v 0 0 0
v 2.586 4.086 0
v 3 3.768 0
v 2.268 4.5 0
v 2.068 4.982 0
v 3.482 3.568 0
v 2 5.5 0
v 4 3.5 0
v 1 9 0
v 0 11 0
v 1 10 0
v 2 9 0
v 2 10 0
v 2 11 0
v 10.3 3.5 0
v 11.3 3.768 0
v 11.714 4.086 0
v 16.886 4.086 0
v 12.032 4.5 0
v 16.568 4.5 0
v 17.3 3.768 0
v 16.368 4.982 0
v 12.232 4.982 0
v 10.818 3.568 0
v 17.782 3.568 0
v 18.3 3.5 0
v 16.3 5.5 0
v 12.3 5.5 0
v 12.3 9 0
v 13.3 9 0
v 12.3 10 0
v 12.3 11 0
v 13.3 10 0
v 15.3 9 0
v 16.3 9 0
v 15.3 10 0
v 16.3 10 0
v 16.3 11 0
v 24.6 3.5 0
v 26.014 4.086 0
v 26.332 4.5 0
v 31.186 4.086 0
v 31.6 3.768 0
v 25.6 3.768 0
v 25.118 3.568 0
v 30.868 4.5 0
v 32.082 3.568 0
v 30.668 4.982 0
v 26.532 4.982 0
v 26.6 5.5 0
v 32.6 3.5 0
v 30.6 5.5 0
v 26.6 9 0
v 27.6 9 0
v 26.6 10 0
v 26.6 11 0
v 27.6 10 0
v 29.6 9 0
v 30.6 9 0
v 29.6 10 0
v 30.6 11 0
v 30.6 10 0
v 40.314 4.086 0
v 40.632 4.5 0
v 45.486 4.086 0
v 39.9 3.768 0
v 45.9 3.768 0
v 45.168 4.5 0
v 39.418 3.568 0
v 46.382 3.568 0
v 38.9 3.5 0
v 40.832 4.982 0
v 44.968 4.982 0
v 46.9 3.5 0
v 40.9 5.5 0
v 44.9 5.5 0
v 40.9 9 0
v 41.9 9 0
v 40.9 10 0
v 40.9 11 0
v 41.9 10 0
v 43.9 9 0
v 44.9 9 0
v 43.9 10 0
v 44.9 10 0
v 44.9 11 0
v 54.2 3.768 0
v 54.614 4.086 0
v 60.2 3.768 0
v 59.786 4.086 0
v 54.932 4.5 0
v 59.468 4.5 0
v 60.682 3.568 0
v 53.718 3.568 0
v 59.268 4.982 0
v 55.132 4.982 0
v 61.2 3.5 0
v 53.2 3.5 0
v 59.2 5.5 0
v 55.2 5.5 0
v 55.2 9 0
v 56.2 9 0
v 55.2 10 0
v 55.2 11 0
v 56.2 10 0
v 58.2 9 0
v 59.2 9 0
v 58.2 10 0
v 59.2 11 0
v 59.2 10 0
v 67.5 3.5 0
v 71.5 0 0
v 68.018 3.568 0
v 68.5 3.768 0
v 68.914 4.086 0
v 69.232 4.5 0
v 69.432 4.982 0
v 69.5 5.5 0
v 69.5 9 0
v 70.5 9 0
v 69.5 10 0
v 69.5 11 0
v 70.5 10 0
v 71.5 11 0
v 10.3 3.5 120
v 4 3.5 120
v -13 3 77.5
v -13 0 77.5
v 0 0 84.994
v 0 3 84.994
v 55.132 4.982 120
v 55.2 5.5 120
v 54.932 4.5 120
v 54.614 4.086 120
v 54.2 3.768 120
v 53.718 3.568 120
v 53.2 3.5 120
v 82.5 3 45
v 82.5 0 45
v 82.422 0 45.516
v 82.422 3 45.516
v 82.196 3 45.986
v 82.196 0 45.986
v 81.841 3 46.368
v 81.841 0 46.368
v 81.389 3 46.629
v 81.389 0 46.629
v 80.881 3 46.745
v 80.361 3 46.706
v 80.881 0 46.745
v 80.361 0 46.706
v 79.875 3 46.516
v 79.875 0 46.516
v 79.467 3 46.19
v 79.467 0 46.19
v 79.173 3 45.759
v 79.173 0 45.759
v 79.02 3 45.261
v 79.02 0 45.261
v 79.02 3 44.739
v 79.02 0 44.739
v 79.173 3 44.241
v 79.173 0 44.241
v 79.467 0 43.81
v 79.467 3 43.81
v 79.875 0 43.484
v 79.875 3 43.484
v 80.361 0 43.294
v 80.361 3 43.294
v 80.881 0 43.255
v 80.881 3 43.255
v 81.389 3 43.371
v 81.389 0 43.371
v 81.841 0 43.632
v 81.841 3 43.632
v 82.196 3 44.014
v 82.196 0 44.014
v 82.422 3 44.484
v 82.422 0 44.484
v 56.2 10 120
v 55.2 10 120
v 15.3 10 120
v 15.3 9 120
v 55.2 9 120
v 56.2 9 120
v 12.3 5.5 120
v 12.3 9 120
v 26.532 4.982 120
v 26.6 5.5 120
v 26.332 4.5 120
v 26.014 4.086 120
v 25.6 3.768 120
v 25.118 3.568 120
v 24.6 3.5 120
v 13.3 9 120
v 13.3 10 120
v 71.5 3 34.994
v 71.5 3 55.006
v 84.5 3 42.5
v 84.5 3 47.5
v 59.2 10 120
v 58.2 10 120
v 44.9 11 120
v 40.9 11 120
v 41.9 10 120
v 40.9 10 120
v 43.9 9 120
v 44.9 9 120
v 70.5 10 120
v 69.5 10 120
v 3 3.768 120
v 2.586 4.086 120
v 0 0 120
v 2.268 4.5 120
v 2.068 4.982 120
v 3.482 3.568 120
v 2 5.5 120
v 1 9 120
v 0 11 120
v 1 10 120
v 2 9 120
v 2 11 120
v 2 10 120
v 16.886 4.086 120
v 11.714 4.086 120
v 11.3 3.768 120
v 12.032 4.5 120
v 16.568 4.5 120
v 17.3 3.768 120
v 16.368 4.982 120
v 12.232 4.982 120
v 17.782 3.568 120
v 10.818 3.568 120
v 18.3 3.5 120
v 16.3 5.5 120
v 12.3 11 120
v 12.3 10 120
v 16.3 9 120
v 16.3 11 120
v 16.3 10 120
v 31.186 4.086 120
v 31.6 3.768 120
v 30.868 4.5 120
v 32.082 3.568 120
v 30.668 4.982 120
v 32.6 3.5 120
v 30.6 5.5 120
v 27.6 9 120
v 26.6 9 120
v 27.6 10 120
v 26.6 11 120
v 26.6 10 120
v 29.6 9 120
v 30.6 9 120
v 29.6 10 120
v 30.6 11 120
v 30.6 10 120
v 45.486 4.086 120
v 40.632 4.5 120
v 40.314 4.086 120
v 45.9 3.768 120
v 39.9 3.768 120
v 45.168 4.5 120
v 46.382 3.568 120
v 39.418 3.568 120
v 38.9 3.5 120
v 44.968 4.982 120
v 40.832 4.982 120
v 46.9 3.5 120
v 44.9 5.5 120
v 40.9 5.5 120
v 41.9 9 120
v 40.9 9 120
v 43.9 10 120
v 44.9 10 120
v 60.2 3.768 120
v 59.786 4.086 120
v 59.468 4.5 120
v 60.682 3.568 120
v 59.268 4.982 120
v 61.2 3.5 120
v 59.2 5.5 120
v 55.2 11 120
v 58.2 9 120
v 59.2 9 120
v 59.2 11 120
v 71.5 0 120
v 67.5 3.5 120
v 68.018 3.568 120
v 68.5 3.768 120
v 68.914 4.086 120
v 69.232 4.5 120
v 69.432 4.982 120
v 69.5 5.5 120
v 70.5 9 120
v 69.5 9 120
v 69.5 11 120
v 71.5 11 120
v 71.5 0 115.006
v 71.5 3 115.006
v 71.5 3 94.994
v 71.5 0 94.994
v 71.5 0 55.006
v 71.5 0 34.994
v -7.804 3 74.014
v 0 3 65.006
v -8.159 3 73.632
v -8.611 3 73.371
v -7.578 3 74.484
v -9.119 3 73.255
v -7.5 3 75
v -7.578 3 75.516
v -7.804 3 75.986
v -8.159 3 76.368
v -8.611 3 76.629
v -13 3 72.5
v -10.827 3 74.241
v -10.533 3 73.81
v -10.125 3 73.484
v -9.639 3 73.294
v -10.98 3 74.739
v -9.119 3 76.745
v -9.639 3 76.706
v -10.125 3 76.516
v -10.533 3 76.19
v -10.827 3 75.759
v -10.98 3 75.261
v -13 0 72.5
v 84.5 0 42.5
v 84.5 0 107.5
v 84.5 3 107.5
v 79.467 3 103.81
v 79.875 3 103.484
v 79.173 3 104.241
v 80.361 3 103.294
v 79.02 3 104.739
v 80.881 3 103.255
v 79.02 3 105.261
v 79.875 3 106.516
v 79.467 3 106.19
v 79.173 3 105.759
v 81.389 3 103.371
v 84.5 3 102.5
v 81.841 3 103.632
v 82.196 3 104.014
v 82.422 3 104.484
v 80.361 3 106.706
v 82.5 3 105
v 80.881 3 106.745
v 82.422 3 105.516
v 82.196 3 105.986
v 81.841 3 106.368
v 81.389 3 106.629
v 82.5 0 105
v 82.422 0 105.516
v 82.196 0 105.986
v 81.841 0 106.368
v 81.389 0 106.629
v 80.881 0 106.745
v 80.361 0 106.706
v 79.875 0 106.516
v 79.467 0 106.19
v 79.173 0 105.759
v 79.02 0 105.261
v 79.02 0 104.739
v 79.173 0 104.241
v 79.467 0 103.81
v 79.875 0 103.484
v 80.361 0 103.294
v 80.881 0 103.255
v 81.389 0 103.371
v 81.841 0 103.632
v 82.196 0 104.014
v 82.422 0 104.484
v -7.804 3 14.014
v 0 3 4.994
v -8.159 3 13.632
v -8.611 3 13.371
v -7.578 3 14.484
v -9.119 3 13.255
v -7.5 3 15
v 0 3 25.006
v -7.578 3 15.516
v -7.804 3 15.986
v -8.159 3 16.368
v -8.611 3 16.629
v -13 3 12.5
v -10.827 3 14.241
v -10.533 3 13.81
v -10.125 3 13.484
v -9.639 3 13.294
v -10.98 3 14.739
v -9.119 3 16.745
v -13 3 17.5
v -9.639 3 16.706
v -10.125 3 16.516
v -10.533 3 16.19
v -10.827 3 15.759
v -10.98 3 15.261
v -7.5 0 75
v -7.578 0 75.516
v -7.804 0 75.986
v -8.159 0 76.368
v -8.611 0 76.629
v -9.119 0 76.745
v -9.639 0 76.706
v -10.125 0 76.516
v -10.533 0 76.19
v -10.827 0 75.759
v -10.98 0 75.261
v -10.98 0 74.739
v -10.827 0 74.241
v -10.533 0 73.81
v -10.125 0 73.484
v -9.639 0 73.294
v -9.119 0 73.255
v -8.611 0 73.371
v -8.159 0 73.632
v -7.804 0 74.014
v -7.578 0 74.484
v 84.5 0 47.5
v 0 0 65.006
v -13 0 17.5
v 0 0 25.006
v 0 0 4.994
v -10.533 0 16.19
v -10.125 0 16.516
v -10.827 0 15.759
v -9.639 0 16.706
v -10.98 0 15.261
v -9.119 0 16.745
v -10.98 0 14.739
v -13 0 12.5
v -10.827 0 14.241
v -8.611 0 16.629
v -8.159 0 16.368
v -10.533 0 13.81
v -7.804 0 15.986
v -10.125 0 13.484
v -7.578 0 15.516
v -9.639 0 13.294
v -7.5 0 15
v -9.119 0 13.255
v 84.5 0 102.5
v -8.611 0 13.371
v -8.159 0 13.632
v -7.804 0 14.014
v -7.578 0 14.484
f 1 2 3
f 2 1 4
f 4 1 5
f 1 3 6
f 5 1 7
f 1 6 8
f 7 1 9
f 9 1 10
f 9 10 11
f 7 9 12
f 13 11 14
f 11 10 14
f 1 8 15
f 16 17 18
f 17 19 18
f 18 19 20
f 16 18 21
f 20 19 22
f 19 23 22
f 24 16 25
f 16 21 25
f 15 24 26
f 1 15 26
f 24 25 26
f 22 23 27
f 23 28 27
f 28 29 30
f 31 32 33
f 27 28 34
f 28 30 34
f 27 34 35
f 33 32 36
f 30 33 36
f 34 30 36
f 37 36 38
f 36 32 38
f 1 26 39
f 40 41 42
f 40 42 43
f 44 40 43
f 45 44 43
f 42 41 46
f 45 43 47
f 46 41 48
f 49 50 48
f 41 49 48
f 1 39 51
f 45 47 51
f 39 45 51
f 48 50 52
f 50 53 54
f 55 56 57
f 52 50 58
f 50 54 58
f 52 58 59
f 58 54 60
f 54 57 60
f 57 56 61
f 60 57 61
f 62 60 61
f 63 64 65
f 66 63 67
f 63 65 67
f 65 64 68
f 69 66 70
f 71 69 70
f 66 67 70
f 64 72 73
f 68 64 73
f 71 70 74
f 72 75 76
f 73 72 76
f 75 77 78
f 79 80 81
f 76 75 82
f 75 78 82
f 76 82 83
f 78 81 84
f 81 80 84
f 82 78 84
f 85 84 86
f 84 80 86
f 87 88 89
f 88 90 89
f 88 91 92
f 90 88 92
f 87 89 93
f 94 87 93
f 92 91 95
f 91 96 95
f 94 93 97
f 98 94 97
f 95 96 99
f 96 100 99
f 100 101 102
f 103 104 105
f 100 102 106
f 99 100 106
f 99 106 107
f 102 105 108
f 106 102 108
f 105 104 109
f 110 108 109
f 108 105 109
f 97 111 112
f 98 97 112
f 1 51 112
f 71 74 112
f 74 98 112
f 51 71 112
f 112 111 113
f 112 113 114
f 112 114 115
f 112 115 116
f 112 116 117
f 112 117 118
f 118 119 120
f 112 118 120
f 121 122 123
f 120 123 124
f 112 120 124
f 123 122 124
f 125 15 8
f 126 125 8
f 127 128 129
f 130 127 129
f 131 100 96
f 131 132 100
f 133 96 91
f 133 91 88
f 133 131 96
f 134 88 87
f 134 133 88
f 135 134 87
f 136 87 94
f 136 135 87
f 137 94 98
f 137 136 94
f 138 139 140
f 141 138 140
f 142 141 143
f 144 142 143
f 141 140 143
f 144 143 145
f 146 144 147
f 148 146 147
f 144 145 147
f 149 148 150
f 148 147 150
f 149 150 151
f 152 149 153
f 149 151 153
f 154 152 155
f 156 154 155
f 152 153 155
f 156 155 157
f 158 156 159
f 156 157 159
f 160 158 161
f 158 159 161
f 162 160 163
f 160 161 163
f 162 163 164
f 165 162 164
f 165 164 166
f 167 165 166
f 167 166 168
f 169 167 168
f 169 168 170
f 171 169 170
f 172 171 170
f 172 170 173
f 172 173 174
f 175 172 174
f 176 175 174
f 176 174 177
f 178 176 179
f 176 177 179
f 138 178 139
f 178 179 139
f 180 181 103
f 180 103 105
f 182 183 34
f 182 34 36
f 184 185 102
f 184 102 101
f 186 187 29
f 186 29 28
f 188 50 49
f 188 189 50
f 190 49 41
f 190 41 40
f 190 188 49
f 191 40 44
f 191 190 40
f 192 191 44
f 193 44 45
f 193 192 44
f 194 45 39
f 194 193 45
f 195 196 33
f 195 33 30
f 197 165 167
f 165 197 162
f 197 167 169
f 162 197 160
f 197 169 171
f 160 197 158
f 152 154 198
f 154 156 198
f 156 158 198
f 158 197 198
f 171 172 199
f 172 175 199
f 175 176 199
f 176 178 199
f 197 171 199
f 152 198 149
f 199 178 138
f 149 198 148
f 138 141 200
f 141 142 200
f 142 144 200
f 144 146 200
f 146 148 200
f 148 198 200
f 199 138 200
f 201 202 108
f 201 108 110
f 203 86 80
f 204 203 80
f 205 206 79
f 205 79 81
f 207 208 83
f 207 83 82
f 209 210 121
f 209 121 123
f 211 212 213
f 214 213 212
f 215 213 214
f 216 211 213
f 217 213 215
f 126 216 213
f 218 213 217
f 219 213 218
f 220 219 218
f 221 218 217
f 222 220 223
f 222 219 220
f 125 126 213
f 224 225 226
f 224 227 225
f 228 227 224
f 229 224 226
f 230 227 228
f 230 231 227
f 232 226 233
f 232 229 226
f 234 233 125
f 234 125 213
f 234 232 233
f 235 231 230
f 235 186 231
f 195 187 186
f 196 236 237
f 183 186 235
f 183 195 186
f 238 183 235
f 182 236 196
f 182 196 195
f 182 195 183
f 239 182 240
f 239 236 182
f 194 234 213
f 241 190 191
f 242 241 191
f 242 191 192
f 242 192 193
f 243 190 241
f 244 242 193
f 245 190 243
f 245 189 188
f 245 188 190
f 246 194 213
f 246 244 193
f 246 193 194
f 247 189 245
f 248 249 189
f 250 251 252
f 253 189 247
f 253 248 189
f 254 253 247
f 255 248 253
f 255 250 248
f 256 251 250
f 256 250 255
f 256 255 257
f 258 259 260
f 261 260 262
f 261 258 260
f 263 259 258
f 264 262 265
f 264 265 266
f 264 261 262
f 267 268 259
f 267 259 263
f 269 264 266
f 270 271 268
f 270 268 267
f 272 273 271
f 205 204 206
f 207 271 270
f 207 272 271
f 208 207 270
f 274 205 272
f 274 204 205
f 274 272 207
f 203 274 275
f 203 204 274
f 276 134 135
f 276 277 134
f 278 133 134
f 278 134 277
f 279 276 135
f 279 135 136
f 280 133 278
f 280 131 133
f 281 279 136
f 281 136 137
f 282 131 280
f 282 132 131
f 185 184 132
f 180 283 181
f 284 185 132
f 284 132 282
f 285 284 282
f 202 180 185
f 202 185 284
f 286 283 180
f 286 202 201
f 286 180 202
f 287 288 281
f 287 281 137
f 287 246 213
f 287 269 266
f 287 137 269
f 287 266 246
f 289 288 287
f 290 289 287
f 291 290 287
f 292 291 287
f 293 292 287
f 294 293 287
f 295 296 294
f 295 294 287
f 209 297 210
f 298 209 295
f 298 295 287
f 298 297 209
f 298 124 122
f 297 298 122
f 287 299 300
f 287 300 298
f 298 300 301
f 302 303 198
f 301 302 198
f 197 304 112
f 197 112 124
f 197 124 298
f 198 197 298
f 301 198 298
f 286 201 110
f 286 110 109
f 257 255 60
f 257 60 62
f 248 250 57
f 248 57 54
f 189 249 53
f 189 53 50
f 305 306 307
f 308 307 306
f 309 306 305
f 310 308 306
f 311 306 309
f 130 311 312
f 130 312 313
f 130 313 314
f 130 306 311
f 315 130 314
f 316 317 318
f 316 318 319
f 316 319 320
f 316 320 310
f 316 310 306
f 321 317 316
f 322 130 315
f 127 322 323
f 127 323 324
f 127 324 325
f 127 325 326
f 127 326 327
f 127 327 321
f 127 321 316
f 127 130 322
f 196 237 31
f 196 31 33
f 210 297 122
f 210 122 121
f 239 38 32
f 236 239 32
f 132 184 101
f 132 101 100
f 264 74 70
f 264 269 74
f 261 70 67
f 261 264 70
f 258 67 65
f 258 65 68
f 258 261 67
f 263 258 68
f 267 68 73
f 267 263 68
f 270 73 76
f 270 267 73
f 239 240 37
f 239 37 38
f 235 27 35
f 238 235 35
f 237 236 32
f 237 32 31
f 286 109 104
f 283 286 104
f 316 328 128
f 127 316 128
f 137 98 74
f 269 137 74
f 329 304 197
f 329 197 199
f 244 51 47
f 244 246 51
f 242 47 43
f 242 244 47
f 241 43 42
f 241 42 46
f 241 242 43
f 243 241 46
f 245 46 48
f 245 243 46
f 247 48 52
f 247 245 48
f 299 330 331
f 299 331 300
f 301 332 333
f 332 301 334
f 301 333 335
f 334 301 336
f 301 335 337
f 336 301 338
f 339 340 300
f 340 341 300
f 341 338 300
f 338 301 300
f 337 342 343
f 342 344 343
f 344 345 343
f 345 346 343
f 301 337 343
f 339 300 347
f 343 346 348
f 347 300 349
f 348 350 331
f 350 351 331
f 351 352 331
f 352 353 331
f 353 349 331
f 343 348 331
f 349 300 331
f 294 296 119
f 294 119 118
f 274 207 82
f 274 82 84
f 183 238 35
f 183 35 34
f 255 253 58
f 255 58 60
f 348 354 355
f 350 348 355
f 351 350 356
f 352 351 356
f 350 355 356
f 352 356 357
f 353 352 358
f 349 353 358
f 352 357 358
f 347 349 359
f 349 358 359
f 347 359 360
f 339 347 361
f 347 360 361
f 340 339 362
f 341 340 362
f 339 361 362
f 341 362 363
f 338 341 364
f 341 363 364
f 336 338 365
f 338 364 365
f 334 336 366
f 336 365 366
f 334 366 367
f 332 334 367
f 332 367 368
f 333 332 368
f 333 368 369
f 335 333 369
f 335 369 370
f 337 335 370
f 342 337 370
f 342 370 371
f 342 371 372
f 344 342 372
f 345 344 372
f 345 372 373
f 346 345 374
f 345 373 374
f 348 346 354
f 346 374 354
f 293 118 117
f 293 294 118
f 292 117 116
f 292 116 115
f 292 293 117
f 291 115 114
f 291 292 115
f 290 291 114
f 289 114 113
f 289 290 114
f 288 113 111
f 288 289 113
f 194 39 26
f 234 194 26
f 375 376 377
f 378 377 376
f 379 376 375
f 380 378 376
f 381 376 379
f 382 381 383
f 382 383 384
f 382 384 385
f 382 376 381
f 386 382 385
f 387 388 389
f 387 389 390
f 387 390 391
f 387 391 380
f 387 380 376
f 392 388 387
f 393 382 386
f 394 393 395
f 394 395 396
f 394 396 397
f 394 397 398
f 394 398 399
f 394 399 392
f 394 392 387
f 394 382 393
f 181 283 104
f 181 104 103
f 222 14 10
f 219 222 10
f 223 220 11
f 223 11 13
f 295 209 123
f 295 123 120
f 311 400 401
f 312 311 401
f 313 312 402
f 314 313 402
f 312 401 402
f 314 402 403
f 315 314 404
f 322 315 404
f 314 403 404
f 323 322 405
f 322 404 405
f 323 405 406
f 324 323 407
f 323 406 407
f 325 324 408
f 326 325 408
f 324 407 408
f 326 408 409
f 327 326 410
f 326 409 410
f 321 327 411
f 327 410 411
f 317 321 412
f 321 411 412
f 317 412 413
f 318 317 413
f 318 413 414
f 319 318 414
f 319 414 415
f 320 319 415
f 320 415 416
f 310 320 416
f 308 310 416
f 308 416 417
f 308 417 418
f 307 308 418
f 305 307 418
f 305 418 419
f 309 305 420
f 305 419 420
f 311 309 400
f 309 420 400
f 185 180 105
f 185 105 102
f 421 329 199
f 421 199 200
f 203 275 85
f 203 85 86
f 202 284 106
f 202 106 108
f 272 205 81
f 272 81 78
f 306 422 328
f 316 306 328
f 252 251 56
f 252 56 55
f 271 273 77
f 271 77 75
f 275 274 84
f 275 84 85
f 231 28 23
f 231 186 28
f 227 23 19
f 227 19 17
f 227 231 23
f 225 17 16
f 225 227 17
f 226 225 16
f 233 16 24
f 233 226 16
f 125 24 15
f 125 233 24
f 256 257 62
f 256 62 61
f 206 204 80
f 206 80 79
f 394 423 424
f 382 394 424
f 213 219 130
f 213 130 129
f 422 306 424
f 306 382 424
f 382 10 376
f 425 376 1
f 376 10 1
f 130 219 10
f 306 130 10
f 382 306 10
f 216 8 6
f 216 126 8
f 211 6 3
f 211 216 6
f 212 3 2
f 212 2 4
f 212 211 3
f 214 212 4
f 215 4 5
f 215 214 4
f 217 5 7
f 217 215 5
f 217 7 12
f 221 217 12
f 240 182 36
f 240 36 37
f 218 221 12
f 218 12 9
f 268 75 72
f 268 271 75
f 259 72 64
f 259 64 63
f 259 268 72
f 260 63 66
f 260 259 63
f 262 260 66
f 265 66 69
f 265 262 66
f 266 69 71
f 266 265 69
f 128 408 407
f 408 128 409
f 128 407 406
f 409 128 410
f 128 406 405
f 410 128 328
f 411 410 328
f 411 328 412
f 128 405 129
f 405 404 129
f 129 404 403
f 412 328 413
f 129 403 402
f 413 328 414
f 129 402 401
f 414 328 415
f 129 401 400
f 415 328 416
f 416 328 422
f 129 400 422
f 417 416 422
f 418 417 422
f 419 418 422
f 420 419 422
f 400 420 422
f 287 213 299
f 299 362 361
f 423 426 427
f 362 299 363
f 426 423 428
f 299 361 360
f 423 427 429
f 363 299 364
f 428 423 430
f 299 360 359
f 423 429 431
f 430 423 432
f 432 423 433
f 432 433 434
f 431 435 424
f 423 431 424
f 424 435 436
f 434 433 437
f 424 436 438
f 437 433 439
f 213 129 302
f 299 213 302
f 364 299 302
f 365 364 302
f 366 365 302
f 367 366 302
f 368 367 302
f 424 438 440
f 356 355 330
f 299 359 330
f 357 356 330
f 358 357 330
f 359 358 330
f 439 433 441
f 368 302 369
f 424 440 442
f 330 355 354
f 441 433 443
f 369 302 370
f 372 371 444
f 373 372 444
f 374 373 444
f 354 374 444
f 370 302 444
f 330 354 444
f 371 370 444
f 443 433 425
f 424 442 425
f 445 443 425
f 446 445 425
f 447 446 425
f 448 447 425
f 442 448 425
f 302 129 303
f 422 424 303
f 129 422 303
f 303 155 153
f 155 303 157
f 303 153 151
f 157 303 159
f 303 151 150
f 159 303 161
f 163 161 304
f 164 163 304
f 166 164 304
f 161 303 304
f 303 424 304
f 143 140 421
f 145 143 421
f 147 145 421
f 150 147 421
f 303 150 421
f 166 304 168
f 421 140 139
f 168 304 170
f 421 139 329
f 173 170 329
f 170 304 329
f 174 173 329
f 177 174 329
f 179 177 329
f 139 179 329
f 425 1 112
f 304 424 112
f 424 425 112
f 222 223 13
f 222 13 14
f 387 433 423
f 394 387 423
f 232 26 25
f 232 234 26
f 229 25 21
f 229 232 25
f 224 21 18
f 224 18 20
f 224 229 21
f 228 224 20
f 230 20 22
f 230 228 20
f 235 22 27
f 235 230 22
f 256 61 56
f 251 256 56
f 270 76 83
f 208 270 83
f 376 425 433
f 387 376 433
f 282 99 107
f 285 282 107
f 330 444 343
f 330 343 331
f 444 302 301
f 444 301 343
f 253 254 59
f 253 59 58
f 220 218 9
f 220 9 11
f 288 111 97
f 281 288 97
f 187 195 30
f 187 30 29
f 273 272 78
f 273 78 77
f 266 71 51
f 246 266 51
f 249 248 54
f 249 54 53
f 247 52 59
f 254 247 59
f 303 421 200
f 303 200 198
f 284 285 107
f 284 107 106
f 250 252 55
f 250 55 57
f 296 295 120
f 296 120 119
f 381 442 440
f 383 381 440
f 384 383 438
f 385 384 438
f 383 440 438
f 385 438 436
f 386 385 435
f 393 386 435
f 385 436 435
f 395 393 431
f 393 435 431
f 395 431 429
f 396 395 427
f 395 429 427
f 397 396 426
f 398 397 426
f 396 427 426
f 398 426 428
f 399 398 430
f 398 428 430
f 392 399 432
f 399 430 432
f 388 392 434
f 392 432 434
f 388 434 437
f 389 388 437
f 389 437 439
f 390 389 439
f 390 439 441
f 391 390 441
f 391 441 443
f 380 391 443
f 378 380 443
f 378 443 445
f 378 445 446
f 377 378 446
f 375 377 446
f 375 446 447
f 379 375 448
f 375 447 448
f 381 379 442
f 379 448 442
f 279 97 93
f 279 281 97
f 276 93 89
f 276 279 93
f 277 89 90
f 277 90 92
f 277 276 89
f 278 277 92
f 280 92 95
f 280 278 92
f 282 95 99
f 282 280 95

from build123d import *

# Parameters (mm, degrees)
PAD_DEPTH    = 120
SKETCH001_R  = 1.75
PAD001_DEPTH = 3
FILLET_R     = 2


with BuildPart() as part:
    # Sketch → Pad (new body)
    with BuildSketch(Plane.XY):
        Polygon((0, 0), (71.5, 0), (71.5, 11), (69.5, 11), (69.5, 10), (70.5, 10), (70.5, 9), (69.5, 9), (69.5, 3.5), (59.2, 3.5), (59.2, 9), (58.2, 9), (58.2, 10), (59.2, 10), (59.2, 11), (55.2, 11), (55.2, 10), (56.2, 10), (56.2, 9), (55.2, 9), (55.2, 3.5), (44.9, 3.5), (44.9, 9), (43.9, 9), (43.9, 10), (44.9, 10), (44.9, 11), (40.9, 11), (40.9, 10), (41.9, 10), (41.9, 9), (40.9, 9), (40.9, 3.5), (30.6, 3.5), (30.6, 9), (29.6, 9), (29.6, 10), (30.6, 10), (30.6, 11), (26.6, 11), (26.6, 10), (27.6, 10), (27.6, 9), (26.6, 9), (26.6, 3.5), (16.3, 3.5), (16.3, 9), (15.3, 9), (15.3, 10), (16.3, 10), (16.3, 11), (12.3, 11), (12.3, 10), (13.3, 10), (13.3, 9), (12.3, 9), (12.3, 3.5), (2, 3.5), (2, 9), (1, 9), (1, 10), (2, 10), (2, 11), (0, 11), align=None)
    extrude(amount=PAD_DEPTH)

    # Sketch001 → Pad001 (join)
    with BuildSketch(Plane.XZ):
        Polygon((0, 4.994447), (-13, 12.5), (-13, 17.5), (0, 25.005553), align=None)
        with Locations((-9.25, 15)):
            Circle(SKETCH001_R, mode=Mode.SUBTRACT)
        Polygon((0, 65.005553), (-13, 72.5), (-13, 77.5), (0, 84.994447), align=None)
        with Locations((-9.25, 75)):
            Circle(SKETCH001_R, mode=Mode.SUBTRACT)
        Polygon((71.5, 34.994447), (84.5, 42.5), (84.5, 47.5), (71.5, 55.005553), align=None)
        with Locations((80.75, 45)):
            Circle(SKETCH001_R, mode=Mode.SUBTRACT)
        Polygon((71.5, 94.994447), (84.5, 102.5), (84.5, 107.5), (71.5, 115.005553), align=None)
        with Locations((80.75, 105)):
            Circle(SKETCH001_R, mode=Mode.SUBTRACT)
    extrude(amount=-PAD001_DEPTH)

    # Fillet
    fillet_edges = [part.edges().sort_by_distance(p)[0] for p in [
        (2, 3.5, 60),
        (16.3, 3.5, 60),
        (30.6, 3.5, 60),
        (44.9, 3.5, 60),
        (59.2, 3.5, 60),
        (12.3, 3.5, 60),
        (26.6, 3.5, 60),
        (40.9, 3.5, 60),
        (55.2, 3.5, 60),
        (69.5, 3.5, 60),
    ]]
    fillet(fillet_edges, radius=FILLET_R)


solid = part.part
